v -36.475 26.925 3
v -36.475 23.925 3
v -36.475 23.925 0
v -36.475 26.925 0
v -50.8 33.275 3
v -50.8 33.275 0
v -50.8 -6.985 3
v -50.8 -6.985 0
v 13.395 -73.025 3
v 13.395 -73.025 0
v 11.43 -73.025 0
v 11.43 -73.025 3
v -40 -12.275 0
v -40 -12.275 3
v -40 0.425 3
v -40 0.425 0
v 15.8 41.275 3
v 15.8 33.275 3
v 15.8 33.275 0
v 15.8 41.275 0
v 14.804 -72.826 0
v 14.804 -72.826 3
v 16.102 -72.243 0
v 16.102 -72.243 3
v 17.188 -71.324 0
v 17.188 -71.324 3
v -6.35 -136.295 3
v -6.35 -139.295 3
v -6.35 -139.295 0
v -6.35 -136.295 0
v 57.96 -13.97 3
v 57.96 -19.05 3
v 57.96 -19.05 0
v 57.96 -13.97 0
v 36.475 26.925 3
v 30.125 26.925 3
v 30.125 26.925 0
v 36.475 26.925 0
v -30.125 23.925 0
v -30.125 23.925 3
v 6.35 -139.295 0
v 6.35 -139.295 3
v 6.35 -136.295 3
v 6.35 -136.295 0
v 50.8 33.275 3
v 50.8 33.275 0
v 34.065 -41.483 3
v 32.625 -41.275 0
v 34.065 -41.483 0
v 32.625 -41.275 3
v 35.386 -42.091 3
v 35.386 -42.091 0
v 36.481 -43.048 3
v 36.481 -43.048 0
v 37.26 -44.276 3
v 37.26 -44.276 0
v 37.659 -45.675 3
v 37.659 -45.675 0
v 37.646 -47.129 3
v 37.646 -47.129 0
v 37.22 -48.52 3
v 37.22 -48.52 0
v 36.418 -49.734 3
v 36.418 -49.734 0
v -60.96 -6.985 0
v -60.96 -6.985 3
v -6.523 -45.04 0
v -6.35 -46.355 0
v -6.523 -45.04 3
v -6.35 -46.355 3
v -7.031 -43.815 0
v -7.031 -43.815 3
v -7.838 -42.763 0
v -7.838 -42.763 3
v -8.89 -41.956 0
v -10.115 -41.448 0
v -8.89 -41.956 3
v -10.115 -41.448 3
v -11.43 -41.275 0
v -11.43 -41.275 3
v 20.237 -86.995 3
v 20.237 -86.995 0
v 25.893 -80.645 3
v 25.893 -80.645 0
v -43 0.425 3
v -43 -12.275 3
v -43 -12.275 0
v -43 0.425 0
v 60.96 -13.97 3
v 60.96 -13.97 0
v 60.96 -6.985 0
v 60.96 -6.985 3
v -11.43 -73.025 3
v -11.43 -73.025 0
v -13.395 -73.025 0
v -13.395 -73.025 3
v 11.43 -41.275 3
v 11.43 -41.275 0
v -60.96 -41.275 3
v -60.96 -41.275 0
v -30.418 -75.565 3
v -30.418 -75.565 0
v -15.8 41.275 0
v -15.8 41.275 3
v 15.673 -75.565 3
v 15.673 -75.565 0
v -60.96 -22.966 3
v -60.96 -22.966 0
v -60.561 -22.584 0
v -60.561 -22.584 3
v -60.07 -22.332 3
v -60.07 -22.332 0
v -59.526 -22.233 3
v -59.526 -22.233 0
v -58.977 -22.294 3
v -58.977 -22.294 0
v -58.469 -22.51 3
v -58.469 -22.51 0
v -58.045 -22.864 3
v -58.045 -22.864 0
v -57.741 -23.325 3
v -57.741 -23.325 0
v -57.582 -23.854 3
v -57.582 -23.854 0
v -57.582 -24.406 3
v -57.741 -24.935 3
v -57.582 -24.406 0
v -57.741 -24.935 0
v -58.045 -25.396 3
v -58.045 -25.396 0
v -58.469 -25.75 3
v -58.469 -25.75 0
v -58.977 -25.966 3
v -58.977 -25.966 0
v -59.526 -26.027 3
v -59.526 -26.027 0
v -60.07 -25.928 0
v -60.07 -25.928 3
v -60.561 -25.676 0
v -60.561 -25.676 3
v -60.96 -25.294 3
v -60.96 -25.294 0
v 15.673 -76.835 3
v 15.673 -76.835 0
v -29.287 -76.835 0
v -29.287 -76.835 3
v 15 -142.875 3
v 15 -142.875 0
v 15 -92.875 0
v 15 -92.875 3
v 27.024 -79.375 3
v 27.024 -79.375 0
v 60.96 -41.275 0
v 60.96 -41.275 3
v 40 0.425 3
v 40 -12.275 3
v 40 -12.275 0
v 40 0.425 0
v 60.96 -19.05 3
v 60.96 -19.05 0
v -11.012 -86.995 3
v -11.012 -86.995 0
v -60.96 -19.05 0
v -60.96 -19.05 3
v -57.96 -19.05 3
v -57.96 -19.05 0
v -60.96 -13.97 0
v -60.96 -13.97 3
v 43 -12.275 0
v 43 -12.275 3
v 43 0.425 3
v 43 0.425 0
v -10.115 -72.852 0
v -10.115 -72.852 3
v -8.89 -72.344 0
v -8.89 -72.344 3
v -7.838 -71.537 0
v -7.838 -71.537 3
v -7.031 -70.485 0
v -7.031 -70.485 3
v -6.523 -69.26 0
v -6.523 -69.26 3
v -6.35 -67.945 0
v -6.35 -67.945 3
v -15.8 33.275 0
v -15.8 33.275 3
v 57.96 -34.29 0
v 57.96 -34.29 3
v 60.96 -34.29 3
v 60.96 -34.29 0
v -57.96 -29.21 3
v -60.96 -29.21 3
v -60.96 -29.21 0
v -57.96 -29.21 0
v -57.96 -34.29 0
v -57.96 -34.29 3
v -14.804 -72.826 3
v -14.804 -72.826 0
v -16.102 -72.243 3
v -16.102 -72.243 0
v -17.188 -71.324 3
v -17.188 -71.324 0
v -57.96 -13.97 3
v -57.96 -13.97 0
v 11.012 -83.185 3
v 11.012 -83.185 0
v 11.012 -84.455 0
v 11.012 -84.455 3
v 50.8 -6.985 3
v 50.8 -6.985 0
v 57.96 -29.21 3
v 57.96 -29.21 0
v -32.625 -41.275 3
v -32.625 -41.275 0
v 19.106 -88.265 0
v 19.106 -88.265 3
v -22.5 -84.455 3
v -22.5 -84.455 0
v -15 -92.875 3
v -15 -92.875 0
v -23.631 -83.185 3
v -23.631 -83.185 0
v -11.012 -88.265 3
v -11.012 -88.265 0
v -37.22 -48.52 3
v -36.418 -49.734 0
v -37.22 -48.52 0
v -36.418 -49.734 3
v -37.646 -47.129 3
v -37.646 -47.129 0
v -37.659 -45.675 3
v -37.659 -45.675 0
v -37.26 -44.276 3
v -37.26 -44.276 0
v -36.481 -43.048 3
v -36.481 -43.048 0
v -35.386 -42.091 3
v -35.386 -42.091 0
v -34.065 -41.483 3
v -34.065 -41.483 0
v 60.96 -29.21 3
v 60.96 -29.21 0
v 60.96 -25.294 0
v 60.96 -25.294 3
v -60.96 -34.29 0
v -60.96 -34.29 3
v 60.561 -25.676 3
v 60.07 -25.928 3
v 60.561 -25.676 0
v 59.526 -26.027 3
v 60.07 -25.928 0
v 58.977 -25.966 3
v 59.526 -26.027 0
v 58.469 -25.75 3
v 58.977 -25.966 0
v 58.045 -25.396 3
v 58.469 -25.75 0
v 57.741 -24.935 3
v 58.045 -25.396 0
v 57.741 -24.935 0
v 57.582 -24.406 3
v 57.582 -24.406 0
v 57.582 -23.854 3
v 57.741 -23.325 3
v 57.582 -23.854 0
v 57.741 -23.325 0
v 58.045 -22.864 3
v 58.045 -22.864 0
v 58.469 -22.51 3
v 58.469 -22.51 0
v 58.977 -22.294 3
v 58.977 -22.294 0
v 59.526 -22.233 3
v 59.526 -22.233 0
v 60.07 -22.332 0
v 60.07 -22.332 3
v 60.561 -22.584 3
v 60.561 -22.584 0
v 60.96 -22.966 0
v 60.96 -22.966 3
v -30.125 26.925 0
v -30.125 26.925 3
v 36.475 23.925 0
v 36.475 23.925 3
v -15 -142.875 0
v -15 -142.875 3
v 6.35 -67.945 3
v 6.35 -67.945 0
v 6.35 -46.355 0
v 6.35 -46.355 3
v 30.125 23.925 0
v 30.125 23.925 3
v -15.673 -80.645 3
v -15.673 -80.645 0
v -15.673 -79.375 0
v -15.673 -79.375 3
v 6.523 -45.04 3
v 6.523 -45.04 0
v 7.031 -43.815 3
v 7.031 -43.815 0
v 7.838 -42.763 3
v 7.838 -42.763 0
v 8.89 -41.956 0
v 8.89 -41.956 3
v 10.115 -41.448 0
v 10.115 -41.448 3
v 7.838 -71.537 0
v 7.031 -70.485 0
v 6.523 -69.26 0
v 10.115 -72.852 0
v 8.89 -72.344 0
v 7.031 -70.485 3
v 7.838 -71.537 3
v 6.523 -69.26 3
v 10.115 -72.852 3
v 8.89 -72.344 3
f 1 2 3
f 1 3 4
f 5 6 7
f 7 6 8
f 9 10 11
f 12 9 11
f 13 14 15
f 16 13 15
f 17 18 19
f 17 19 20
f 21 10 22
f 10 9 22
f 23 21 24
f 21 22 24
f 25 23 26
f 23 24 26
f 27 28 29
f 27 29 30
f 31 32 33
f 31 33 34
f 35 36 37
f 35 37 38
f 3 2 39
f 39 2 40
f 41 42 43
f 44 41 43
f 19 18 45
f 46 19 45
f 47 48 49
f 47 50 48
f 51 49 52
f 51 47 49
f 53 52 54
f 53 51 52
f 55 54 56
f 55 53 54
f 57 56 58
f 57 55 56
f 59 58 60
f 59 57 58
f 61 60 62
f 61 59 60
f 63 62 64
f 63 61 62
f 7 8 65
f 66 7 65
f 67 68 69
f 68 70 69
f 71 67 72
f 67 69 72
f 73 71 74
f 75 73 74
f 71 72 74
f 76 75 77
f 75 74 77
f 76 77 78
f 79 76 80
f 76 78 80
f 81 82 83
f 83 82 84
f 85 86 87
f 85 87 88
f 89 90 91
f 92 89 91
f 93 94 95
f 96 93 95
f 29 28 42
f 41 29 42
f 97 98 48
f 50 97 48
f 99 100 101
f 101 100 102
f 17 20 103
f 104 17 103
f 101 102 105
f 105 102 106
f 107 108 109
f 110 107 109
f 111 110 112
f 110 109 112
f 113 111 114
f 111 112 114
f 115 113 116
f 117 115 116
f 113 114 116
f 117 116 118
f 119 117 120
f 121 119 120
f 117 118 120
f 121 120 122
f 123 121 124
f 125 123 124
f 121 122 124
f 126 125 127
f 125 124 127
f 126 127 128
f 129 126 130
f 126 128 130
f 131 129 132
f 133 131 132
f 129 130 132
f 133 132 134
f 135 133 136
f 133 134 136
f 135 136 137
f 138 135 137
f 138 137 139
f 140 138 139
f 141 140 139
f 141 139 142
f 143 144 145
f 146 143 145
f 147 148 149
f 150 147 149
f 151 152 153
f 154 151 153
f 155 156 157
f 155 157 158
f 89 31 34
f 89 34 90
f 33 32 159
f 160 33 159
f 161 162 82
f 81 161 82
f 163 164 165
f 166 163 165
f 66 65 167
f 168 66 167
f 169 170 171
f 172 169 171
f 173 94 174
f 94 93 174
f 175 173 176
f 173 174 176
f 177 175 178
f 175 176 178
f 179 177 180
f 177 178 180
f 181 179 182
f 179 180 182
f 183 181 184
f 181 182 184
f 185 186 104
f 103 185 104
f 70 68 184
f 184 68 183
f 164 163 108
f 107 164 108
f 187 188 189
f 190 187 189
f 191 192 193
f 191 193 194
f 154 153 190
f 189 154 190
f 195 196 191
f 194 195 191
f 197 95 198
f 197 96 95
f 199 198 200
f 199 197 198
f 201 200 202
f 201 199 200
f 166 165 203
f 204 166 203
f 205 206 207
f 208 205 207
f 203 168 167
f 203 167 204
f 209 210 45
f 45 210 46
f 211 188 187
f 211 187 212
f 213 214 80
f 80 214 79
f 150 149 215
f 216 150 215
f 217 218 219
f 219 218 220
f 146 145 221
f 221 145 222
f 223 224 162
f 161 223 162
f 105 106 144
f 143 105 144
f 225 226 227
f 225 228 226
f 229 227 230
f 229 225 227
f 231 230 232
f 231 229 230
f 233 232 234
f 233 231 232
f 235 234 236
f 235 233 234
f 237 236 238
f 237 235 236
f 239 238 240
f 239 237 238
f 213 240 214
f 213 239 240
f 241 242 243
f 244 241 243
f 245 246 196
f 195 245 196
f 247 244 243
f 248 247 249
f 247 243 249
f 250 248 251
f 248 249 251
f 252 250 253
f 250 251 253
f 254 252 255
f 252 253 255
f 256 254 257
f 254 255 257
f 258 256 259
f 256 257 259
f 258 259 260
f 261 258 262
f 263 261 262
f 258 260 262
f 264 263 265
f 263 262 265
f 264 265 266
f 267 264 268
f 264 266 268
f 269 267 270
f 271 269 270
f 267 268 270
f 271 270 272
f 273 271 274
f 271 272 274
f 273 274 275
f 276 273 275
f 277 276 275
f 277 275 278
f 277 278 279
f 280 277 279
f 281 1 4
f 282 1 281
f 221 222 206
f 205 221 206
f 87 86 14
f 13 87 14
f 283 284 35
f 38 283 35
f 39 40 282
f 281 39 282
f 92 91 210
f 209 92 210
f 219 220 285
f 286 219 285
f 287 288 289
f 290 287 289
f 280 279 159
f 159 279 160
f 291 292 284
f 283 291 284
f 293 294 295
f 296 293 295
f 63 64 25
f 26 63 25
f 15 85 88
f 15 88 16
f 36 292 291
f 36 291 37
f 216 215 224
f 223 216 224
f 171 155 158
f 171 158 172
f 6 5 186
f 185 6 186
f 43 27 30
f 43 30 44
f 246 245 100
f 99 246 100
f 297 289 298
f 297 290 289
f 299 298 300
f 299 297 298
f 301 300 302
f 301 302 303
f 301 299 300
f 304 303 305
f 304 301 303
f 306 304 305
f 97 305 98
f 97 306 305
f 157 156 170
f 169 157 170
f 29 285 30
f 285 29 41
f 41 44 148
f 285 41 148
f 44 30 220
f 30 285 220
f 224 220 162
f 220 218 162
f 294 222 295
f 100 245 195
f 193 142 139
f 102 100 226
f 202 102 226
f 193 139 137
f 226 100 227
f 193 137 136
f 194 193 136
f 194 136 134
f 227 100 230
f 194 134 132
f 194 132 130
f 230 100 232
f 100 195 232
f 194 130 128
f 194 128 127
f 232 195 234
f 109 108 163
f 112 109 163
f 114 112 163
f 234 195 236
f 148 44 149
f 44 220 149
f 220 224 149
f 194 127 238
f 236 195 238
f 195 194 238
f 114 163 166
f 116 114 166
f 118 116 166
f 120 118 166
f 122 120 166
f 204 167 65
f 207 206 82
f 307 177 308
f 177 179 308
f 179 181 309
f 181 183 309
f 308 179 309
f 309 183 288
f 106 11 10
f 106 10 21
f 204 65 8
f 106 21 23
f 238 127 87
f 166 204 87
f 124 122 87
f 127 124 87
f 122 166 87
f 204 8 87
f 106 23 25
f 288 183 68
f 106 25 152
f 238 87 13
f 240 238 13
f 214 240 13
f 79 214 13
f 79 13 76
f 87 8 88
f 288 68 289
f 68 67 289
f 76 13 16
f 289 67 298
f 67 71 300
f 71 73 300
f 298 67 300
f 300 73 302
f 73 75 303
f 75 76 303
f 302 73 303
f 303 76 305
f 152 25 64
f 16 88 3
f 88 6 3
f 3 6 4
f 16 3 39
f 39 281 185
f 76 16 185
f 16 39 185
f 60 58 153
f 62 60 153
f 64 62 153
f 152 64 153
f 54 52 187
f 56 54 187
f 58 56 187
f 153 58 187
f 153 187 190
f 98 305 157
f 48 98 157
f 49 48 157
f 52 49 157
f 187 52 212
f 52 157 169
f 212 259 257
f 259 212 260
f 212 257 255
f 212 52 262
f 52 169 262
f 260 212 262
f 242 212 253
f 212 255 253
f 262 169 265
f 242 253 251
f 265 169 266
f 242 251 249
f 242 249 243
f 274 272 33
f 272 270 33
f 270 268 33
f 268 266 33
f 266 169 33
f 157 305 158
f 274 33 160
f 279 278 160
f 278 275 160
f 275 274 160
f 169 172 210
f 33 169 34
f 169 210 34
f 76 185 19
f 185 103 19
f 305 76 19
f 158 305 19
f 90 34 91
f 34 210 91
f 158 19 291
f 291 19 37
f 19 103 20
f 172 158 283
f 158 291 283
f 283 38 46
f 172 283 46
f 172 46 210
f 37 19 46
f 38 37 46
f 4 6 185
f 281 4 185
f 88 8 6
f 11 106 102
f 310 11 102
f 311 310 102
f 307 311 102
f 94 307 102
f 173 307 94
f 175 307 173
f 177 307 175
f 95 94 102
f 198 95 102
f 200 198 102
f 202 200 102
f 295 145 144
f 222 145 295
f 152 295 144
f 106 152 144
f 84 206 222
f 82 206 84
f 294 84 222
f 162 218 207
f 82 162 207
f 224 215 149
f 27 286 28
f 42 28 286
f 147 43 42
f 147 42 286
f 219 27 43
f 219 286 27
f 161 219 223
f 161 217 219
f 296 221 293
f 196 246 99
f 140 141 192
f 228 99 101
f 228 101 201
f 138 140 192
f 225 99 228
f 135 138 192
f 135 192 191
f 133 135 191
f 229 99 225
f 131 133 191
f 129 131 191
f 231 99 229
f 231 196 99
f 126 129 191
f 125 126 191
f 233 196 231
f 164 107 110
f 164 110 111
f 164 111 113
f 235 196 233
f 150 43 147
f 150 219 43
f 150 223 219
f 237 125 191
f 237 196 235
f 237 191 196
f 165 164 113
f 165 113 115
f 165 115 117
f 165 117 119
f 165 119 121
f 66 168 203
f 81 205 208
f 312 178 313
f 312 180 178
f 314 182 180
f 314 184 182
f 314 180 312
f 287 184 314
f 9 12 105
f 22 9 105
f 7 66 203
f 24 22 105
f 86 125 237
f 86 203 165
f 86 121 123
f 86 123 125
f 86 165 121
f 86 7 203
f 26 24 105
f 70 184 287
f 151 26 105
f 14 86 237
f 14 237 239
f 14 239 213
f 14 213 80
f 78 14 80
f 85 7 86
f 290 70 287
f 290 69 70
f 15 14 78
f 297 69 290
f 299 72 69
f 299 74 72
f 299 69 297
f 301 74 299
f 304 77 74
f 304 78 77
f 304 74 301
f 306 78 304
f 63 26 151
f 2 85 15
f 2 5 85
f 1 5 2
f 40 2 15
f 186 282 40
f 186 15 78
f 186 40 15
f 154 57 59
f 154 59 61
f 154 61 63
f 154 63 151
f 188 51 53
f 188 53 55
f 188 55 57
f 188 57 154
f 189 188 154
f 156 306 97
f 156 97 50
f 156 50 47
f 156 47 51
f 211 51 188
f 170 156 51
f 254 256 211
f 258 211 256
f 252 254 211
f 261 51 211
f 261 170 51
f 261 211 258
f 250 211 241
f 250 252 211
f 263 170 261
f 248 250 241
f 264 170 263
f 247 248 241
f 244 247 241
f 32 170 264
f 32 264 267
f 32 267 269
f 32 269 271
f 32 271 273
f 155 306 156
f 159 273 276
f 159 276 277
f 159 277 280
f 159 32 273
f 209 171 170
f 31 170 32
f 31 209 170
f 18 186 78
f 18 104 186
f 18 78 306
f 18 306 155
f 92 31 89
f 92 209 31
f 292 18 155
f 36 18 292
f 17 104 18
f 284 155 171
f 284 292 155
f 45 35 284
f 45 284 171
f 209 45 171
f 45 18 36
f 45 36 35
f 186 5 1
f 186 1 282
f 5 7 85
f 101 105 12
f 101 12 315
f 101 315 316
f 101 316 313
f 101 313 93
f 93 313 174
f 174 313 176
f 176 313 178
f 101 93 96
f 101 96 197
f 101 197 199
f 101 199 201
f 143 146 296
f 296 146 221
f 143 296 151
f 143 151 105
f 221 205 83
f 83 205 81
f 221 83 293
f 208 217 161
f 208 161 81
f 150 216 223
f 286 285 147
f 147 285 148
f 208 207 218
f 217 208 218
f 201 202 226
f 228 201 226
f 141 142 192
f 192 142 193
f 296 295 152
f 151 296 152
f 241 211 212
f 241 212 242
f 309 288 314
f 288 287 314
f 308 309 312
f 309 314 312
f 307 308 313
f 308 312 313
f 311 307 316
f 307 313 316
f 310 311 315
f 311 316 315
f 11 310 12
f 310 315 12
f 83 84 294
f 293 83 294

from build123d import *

# Parameters (mm, degrees)
F1_DEPTH = 3
F3_D     = 3.7973
F4_W     = 3
F4_H     = 5.08
F4_W_2   = 35
F4_H_2   = 8
F4_W_3   = 6.35
F4_H_3   = 3
F4_H_4   = 12.7
F4_W_4   = 12.7
F5_DEPTH = 3.001
F6_R     = 5.08


with BuildPart() as f1:
    # F0 (on Top) → F1 (new body)
    with BuildSketch(Plane.XY):
        Polygon((50.8, 41.275), (-50.8, 41.275), (-50.8, -6.985), (-60.96, -6.985), (-60.96, -41.275), (-30.4179767442, -75.565), (15.6730507807, -75.565), (15.6730507807, -76.835), (-29.2867906977, -76.835), (-23.6308604651, -83.185), (11.0115253904, -83.185), (11.0115253904, -84.455), (-22.4996744186, -84.455), (-15, -92.875), (-15, -142.875), (15, -142.875), (15, -92.875), (19.1061162791, -88.265), (-11.0115253904, -88.265), (-11.0115253904, -86.995), (20.2373023256, -86.995), (25.8932325581, -80.645), (-15.6730507807, -80.645), (-15.6730507807, -79.375), (27.0244186047, -79.375), (60.96, -41.275), (60.96, -6.985), (50.8, -6.985), align=None)
        Polygon((-15.6730507807, -73.025), (-43.9527019435, -41.275), (-6.35, -41.275), (-6.35, -73.025), align=None, mode=Mode.SUBTRACT)
        Polygon((6.35, -41.275), (43.9527019435, -41.275), (15.6730507807, -73.025), (6.35, -73.025), align=None, mode=Mode.SUBTRACT)
    extrude(amount=F1_DEPTH)

    # F3 (through all)
    with Locations(Plane.XY.offset(3)):
        with Locations((-59.46, -24.13), (59.46, -24.13)):
            Hole(F3_D / 2)

    # F4 (on face) → F5 (cut, through all)
    with BuildSketch(Plane.XY.offset(3)):
        with Locations((-59.46, -31.75)):
            Rectangle(F4_W, F4_H)
        with Locations((-59.46, -16.51)):
            Rectangle(F4_W, F4_H)
        with Locations((59.46, -16.51)):
            Rectangle(F4_W, F4_H)
        with Locations((59.46, -31.75)):
            Rectangle(F4_W, F4_H)
        with Locations((-33.3, 37.275)):
            Rectangle(F4_W_2, F4_H_2)
        with Locations((33.3, 37.275)):
            Rectangle(F4_W_2, F4_H_2)
        with Locations((-33.3, 25.425)):
            Rectangle(F4_W_3, F4_H_3)
        with Locations((33.3, 25.425)):
            Rectangle(F4_W_3, F4_H_3)
        with Locations((41.5, -5.925)):
            Rectangle(F4_W, F4_H_4)
        with Locations((-41.5, -5.925)):
            Rectangle(F4_W, F4_H_4)
        with Locations((0, -137.795)):
            Rectangle(F4_W_4, F4_H_3)
    extrude(amount=-F5_DEPTH, mode=Mode.SUBTRACT)

    # F6
    f6_edges = [f1.edges().sort_by_distance(p)[0] for p in [
        (-43.952702, -41.275, 1.5),
        (-6.35, -41.275, 1.5),
        (43.952702, -41.275, 1.5),
        (6.35, -41.275, 1.5),
        (15.673051, -73.025, 1.5),
        (-15.673051, -73.025, 1.5),
        (-6.35, -73.025, 1.5),
        (6.35, -73.025, 1.5),
    ]]
    fillet(f6_edges, radius=F6_R)


solid = f1.part
